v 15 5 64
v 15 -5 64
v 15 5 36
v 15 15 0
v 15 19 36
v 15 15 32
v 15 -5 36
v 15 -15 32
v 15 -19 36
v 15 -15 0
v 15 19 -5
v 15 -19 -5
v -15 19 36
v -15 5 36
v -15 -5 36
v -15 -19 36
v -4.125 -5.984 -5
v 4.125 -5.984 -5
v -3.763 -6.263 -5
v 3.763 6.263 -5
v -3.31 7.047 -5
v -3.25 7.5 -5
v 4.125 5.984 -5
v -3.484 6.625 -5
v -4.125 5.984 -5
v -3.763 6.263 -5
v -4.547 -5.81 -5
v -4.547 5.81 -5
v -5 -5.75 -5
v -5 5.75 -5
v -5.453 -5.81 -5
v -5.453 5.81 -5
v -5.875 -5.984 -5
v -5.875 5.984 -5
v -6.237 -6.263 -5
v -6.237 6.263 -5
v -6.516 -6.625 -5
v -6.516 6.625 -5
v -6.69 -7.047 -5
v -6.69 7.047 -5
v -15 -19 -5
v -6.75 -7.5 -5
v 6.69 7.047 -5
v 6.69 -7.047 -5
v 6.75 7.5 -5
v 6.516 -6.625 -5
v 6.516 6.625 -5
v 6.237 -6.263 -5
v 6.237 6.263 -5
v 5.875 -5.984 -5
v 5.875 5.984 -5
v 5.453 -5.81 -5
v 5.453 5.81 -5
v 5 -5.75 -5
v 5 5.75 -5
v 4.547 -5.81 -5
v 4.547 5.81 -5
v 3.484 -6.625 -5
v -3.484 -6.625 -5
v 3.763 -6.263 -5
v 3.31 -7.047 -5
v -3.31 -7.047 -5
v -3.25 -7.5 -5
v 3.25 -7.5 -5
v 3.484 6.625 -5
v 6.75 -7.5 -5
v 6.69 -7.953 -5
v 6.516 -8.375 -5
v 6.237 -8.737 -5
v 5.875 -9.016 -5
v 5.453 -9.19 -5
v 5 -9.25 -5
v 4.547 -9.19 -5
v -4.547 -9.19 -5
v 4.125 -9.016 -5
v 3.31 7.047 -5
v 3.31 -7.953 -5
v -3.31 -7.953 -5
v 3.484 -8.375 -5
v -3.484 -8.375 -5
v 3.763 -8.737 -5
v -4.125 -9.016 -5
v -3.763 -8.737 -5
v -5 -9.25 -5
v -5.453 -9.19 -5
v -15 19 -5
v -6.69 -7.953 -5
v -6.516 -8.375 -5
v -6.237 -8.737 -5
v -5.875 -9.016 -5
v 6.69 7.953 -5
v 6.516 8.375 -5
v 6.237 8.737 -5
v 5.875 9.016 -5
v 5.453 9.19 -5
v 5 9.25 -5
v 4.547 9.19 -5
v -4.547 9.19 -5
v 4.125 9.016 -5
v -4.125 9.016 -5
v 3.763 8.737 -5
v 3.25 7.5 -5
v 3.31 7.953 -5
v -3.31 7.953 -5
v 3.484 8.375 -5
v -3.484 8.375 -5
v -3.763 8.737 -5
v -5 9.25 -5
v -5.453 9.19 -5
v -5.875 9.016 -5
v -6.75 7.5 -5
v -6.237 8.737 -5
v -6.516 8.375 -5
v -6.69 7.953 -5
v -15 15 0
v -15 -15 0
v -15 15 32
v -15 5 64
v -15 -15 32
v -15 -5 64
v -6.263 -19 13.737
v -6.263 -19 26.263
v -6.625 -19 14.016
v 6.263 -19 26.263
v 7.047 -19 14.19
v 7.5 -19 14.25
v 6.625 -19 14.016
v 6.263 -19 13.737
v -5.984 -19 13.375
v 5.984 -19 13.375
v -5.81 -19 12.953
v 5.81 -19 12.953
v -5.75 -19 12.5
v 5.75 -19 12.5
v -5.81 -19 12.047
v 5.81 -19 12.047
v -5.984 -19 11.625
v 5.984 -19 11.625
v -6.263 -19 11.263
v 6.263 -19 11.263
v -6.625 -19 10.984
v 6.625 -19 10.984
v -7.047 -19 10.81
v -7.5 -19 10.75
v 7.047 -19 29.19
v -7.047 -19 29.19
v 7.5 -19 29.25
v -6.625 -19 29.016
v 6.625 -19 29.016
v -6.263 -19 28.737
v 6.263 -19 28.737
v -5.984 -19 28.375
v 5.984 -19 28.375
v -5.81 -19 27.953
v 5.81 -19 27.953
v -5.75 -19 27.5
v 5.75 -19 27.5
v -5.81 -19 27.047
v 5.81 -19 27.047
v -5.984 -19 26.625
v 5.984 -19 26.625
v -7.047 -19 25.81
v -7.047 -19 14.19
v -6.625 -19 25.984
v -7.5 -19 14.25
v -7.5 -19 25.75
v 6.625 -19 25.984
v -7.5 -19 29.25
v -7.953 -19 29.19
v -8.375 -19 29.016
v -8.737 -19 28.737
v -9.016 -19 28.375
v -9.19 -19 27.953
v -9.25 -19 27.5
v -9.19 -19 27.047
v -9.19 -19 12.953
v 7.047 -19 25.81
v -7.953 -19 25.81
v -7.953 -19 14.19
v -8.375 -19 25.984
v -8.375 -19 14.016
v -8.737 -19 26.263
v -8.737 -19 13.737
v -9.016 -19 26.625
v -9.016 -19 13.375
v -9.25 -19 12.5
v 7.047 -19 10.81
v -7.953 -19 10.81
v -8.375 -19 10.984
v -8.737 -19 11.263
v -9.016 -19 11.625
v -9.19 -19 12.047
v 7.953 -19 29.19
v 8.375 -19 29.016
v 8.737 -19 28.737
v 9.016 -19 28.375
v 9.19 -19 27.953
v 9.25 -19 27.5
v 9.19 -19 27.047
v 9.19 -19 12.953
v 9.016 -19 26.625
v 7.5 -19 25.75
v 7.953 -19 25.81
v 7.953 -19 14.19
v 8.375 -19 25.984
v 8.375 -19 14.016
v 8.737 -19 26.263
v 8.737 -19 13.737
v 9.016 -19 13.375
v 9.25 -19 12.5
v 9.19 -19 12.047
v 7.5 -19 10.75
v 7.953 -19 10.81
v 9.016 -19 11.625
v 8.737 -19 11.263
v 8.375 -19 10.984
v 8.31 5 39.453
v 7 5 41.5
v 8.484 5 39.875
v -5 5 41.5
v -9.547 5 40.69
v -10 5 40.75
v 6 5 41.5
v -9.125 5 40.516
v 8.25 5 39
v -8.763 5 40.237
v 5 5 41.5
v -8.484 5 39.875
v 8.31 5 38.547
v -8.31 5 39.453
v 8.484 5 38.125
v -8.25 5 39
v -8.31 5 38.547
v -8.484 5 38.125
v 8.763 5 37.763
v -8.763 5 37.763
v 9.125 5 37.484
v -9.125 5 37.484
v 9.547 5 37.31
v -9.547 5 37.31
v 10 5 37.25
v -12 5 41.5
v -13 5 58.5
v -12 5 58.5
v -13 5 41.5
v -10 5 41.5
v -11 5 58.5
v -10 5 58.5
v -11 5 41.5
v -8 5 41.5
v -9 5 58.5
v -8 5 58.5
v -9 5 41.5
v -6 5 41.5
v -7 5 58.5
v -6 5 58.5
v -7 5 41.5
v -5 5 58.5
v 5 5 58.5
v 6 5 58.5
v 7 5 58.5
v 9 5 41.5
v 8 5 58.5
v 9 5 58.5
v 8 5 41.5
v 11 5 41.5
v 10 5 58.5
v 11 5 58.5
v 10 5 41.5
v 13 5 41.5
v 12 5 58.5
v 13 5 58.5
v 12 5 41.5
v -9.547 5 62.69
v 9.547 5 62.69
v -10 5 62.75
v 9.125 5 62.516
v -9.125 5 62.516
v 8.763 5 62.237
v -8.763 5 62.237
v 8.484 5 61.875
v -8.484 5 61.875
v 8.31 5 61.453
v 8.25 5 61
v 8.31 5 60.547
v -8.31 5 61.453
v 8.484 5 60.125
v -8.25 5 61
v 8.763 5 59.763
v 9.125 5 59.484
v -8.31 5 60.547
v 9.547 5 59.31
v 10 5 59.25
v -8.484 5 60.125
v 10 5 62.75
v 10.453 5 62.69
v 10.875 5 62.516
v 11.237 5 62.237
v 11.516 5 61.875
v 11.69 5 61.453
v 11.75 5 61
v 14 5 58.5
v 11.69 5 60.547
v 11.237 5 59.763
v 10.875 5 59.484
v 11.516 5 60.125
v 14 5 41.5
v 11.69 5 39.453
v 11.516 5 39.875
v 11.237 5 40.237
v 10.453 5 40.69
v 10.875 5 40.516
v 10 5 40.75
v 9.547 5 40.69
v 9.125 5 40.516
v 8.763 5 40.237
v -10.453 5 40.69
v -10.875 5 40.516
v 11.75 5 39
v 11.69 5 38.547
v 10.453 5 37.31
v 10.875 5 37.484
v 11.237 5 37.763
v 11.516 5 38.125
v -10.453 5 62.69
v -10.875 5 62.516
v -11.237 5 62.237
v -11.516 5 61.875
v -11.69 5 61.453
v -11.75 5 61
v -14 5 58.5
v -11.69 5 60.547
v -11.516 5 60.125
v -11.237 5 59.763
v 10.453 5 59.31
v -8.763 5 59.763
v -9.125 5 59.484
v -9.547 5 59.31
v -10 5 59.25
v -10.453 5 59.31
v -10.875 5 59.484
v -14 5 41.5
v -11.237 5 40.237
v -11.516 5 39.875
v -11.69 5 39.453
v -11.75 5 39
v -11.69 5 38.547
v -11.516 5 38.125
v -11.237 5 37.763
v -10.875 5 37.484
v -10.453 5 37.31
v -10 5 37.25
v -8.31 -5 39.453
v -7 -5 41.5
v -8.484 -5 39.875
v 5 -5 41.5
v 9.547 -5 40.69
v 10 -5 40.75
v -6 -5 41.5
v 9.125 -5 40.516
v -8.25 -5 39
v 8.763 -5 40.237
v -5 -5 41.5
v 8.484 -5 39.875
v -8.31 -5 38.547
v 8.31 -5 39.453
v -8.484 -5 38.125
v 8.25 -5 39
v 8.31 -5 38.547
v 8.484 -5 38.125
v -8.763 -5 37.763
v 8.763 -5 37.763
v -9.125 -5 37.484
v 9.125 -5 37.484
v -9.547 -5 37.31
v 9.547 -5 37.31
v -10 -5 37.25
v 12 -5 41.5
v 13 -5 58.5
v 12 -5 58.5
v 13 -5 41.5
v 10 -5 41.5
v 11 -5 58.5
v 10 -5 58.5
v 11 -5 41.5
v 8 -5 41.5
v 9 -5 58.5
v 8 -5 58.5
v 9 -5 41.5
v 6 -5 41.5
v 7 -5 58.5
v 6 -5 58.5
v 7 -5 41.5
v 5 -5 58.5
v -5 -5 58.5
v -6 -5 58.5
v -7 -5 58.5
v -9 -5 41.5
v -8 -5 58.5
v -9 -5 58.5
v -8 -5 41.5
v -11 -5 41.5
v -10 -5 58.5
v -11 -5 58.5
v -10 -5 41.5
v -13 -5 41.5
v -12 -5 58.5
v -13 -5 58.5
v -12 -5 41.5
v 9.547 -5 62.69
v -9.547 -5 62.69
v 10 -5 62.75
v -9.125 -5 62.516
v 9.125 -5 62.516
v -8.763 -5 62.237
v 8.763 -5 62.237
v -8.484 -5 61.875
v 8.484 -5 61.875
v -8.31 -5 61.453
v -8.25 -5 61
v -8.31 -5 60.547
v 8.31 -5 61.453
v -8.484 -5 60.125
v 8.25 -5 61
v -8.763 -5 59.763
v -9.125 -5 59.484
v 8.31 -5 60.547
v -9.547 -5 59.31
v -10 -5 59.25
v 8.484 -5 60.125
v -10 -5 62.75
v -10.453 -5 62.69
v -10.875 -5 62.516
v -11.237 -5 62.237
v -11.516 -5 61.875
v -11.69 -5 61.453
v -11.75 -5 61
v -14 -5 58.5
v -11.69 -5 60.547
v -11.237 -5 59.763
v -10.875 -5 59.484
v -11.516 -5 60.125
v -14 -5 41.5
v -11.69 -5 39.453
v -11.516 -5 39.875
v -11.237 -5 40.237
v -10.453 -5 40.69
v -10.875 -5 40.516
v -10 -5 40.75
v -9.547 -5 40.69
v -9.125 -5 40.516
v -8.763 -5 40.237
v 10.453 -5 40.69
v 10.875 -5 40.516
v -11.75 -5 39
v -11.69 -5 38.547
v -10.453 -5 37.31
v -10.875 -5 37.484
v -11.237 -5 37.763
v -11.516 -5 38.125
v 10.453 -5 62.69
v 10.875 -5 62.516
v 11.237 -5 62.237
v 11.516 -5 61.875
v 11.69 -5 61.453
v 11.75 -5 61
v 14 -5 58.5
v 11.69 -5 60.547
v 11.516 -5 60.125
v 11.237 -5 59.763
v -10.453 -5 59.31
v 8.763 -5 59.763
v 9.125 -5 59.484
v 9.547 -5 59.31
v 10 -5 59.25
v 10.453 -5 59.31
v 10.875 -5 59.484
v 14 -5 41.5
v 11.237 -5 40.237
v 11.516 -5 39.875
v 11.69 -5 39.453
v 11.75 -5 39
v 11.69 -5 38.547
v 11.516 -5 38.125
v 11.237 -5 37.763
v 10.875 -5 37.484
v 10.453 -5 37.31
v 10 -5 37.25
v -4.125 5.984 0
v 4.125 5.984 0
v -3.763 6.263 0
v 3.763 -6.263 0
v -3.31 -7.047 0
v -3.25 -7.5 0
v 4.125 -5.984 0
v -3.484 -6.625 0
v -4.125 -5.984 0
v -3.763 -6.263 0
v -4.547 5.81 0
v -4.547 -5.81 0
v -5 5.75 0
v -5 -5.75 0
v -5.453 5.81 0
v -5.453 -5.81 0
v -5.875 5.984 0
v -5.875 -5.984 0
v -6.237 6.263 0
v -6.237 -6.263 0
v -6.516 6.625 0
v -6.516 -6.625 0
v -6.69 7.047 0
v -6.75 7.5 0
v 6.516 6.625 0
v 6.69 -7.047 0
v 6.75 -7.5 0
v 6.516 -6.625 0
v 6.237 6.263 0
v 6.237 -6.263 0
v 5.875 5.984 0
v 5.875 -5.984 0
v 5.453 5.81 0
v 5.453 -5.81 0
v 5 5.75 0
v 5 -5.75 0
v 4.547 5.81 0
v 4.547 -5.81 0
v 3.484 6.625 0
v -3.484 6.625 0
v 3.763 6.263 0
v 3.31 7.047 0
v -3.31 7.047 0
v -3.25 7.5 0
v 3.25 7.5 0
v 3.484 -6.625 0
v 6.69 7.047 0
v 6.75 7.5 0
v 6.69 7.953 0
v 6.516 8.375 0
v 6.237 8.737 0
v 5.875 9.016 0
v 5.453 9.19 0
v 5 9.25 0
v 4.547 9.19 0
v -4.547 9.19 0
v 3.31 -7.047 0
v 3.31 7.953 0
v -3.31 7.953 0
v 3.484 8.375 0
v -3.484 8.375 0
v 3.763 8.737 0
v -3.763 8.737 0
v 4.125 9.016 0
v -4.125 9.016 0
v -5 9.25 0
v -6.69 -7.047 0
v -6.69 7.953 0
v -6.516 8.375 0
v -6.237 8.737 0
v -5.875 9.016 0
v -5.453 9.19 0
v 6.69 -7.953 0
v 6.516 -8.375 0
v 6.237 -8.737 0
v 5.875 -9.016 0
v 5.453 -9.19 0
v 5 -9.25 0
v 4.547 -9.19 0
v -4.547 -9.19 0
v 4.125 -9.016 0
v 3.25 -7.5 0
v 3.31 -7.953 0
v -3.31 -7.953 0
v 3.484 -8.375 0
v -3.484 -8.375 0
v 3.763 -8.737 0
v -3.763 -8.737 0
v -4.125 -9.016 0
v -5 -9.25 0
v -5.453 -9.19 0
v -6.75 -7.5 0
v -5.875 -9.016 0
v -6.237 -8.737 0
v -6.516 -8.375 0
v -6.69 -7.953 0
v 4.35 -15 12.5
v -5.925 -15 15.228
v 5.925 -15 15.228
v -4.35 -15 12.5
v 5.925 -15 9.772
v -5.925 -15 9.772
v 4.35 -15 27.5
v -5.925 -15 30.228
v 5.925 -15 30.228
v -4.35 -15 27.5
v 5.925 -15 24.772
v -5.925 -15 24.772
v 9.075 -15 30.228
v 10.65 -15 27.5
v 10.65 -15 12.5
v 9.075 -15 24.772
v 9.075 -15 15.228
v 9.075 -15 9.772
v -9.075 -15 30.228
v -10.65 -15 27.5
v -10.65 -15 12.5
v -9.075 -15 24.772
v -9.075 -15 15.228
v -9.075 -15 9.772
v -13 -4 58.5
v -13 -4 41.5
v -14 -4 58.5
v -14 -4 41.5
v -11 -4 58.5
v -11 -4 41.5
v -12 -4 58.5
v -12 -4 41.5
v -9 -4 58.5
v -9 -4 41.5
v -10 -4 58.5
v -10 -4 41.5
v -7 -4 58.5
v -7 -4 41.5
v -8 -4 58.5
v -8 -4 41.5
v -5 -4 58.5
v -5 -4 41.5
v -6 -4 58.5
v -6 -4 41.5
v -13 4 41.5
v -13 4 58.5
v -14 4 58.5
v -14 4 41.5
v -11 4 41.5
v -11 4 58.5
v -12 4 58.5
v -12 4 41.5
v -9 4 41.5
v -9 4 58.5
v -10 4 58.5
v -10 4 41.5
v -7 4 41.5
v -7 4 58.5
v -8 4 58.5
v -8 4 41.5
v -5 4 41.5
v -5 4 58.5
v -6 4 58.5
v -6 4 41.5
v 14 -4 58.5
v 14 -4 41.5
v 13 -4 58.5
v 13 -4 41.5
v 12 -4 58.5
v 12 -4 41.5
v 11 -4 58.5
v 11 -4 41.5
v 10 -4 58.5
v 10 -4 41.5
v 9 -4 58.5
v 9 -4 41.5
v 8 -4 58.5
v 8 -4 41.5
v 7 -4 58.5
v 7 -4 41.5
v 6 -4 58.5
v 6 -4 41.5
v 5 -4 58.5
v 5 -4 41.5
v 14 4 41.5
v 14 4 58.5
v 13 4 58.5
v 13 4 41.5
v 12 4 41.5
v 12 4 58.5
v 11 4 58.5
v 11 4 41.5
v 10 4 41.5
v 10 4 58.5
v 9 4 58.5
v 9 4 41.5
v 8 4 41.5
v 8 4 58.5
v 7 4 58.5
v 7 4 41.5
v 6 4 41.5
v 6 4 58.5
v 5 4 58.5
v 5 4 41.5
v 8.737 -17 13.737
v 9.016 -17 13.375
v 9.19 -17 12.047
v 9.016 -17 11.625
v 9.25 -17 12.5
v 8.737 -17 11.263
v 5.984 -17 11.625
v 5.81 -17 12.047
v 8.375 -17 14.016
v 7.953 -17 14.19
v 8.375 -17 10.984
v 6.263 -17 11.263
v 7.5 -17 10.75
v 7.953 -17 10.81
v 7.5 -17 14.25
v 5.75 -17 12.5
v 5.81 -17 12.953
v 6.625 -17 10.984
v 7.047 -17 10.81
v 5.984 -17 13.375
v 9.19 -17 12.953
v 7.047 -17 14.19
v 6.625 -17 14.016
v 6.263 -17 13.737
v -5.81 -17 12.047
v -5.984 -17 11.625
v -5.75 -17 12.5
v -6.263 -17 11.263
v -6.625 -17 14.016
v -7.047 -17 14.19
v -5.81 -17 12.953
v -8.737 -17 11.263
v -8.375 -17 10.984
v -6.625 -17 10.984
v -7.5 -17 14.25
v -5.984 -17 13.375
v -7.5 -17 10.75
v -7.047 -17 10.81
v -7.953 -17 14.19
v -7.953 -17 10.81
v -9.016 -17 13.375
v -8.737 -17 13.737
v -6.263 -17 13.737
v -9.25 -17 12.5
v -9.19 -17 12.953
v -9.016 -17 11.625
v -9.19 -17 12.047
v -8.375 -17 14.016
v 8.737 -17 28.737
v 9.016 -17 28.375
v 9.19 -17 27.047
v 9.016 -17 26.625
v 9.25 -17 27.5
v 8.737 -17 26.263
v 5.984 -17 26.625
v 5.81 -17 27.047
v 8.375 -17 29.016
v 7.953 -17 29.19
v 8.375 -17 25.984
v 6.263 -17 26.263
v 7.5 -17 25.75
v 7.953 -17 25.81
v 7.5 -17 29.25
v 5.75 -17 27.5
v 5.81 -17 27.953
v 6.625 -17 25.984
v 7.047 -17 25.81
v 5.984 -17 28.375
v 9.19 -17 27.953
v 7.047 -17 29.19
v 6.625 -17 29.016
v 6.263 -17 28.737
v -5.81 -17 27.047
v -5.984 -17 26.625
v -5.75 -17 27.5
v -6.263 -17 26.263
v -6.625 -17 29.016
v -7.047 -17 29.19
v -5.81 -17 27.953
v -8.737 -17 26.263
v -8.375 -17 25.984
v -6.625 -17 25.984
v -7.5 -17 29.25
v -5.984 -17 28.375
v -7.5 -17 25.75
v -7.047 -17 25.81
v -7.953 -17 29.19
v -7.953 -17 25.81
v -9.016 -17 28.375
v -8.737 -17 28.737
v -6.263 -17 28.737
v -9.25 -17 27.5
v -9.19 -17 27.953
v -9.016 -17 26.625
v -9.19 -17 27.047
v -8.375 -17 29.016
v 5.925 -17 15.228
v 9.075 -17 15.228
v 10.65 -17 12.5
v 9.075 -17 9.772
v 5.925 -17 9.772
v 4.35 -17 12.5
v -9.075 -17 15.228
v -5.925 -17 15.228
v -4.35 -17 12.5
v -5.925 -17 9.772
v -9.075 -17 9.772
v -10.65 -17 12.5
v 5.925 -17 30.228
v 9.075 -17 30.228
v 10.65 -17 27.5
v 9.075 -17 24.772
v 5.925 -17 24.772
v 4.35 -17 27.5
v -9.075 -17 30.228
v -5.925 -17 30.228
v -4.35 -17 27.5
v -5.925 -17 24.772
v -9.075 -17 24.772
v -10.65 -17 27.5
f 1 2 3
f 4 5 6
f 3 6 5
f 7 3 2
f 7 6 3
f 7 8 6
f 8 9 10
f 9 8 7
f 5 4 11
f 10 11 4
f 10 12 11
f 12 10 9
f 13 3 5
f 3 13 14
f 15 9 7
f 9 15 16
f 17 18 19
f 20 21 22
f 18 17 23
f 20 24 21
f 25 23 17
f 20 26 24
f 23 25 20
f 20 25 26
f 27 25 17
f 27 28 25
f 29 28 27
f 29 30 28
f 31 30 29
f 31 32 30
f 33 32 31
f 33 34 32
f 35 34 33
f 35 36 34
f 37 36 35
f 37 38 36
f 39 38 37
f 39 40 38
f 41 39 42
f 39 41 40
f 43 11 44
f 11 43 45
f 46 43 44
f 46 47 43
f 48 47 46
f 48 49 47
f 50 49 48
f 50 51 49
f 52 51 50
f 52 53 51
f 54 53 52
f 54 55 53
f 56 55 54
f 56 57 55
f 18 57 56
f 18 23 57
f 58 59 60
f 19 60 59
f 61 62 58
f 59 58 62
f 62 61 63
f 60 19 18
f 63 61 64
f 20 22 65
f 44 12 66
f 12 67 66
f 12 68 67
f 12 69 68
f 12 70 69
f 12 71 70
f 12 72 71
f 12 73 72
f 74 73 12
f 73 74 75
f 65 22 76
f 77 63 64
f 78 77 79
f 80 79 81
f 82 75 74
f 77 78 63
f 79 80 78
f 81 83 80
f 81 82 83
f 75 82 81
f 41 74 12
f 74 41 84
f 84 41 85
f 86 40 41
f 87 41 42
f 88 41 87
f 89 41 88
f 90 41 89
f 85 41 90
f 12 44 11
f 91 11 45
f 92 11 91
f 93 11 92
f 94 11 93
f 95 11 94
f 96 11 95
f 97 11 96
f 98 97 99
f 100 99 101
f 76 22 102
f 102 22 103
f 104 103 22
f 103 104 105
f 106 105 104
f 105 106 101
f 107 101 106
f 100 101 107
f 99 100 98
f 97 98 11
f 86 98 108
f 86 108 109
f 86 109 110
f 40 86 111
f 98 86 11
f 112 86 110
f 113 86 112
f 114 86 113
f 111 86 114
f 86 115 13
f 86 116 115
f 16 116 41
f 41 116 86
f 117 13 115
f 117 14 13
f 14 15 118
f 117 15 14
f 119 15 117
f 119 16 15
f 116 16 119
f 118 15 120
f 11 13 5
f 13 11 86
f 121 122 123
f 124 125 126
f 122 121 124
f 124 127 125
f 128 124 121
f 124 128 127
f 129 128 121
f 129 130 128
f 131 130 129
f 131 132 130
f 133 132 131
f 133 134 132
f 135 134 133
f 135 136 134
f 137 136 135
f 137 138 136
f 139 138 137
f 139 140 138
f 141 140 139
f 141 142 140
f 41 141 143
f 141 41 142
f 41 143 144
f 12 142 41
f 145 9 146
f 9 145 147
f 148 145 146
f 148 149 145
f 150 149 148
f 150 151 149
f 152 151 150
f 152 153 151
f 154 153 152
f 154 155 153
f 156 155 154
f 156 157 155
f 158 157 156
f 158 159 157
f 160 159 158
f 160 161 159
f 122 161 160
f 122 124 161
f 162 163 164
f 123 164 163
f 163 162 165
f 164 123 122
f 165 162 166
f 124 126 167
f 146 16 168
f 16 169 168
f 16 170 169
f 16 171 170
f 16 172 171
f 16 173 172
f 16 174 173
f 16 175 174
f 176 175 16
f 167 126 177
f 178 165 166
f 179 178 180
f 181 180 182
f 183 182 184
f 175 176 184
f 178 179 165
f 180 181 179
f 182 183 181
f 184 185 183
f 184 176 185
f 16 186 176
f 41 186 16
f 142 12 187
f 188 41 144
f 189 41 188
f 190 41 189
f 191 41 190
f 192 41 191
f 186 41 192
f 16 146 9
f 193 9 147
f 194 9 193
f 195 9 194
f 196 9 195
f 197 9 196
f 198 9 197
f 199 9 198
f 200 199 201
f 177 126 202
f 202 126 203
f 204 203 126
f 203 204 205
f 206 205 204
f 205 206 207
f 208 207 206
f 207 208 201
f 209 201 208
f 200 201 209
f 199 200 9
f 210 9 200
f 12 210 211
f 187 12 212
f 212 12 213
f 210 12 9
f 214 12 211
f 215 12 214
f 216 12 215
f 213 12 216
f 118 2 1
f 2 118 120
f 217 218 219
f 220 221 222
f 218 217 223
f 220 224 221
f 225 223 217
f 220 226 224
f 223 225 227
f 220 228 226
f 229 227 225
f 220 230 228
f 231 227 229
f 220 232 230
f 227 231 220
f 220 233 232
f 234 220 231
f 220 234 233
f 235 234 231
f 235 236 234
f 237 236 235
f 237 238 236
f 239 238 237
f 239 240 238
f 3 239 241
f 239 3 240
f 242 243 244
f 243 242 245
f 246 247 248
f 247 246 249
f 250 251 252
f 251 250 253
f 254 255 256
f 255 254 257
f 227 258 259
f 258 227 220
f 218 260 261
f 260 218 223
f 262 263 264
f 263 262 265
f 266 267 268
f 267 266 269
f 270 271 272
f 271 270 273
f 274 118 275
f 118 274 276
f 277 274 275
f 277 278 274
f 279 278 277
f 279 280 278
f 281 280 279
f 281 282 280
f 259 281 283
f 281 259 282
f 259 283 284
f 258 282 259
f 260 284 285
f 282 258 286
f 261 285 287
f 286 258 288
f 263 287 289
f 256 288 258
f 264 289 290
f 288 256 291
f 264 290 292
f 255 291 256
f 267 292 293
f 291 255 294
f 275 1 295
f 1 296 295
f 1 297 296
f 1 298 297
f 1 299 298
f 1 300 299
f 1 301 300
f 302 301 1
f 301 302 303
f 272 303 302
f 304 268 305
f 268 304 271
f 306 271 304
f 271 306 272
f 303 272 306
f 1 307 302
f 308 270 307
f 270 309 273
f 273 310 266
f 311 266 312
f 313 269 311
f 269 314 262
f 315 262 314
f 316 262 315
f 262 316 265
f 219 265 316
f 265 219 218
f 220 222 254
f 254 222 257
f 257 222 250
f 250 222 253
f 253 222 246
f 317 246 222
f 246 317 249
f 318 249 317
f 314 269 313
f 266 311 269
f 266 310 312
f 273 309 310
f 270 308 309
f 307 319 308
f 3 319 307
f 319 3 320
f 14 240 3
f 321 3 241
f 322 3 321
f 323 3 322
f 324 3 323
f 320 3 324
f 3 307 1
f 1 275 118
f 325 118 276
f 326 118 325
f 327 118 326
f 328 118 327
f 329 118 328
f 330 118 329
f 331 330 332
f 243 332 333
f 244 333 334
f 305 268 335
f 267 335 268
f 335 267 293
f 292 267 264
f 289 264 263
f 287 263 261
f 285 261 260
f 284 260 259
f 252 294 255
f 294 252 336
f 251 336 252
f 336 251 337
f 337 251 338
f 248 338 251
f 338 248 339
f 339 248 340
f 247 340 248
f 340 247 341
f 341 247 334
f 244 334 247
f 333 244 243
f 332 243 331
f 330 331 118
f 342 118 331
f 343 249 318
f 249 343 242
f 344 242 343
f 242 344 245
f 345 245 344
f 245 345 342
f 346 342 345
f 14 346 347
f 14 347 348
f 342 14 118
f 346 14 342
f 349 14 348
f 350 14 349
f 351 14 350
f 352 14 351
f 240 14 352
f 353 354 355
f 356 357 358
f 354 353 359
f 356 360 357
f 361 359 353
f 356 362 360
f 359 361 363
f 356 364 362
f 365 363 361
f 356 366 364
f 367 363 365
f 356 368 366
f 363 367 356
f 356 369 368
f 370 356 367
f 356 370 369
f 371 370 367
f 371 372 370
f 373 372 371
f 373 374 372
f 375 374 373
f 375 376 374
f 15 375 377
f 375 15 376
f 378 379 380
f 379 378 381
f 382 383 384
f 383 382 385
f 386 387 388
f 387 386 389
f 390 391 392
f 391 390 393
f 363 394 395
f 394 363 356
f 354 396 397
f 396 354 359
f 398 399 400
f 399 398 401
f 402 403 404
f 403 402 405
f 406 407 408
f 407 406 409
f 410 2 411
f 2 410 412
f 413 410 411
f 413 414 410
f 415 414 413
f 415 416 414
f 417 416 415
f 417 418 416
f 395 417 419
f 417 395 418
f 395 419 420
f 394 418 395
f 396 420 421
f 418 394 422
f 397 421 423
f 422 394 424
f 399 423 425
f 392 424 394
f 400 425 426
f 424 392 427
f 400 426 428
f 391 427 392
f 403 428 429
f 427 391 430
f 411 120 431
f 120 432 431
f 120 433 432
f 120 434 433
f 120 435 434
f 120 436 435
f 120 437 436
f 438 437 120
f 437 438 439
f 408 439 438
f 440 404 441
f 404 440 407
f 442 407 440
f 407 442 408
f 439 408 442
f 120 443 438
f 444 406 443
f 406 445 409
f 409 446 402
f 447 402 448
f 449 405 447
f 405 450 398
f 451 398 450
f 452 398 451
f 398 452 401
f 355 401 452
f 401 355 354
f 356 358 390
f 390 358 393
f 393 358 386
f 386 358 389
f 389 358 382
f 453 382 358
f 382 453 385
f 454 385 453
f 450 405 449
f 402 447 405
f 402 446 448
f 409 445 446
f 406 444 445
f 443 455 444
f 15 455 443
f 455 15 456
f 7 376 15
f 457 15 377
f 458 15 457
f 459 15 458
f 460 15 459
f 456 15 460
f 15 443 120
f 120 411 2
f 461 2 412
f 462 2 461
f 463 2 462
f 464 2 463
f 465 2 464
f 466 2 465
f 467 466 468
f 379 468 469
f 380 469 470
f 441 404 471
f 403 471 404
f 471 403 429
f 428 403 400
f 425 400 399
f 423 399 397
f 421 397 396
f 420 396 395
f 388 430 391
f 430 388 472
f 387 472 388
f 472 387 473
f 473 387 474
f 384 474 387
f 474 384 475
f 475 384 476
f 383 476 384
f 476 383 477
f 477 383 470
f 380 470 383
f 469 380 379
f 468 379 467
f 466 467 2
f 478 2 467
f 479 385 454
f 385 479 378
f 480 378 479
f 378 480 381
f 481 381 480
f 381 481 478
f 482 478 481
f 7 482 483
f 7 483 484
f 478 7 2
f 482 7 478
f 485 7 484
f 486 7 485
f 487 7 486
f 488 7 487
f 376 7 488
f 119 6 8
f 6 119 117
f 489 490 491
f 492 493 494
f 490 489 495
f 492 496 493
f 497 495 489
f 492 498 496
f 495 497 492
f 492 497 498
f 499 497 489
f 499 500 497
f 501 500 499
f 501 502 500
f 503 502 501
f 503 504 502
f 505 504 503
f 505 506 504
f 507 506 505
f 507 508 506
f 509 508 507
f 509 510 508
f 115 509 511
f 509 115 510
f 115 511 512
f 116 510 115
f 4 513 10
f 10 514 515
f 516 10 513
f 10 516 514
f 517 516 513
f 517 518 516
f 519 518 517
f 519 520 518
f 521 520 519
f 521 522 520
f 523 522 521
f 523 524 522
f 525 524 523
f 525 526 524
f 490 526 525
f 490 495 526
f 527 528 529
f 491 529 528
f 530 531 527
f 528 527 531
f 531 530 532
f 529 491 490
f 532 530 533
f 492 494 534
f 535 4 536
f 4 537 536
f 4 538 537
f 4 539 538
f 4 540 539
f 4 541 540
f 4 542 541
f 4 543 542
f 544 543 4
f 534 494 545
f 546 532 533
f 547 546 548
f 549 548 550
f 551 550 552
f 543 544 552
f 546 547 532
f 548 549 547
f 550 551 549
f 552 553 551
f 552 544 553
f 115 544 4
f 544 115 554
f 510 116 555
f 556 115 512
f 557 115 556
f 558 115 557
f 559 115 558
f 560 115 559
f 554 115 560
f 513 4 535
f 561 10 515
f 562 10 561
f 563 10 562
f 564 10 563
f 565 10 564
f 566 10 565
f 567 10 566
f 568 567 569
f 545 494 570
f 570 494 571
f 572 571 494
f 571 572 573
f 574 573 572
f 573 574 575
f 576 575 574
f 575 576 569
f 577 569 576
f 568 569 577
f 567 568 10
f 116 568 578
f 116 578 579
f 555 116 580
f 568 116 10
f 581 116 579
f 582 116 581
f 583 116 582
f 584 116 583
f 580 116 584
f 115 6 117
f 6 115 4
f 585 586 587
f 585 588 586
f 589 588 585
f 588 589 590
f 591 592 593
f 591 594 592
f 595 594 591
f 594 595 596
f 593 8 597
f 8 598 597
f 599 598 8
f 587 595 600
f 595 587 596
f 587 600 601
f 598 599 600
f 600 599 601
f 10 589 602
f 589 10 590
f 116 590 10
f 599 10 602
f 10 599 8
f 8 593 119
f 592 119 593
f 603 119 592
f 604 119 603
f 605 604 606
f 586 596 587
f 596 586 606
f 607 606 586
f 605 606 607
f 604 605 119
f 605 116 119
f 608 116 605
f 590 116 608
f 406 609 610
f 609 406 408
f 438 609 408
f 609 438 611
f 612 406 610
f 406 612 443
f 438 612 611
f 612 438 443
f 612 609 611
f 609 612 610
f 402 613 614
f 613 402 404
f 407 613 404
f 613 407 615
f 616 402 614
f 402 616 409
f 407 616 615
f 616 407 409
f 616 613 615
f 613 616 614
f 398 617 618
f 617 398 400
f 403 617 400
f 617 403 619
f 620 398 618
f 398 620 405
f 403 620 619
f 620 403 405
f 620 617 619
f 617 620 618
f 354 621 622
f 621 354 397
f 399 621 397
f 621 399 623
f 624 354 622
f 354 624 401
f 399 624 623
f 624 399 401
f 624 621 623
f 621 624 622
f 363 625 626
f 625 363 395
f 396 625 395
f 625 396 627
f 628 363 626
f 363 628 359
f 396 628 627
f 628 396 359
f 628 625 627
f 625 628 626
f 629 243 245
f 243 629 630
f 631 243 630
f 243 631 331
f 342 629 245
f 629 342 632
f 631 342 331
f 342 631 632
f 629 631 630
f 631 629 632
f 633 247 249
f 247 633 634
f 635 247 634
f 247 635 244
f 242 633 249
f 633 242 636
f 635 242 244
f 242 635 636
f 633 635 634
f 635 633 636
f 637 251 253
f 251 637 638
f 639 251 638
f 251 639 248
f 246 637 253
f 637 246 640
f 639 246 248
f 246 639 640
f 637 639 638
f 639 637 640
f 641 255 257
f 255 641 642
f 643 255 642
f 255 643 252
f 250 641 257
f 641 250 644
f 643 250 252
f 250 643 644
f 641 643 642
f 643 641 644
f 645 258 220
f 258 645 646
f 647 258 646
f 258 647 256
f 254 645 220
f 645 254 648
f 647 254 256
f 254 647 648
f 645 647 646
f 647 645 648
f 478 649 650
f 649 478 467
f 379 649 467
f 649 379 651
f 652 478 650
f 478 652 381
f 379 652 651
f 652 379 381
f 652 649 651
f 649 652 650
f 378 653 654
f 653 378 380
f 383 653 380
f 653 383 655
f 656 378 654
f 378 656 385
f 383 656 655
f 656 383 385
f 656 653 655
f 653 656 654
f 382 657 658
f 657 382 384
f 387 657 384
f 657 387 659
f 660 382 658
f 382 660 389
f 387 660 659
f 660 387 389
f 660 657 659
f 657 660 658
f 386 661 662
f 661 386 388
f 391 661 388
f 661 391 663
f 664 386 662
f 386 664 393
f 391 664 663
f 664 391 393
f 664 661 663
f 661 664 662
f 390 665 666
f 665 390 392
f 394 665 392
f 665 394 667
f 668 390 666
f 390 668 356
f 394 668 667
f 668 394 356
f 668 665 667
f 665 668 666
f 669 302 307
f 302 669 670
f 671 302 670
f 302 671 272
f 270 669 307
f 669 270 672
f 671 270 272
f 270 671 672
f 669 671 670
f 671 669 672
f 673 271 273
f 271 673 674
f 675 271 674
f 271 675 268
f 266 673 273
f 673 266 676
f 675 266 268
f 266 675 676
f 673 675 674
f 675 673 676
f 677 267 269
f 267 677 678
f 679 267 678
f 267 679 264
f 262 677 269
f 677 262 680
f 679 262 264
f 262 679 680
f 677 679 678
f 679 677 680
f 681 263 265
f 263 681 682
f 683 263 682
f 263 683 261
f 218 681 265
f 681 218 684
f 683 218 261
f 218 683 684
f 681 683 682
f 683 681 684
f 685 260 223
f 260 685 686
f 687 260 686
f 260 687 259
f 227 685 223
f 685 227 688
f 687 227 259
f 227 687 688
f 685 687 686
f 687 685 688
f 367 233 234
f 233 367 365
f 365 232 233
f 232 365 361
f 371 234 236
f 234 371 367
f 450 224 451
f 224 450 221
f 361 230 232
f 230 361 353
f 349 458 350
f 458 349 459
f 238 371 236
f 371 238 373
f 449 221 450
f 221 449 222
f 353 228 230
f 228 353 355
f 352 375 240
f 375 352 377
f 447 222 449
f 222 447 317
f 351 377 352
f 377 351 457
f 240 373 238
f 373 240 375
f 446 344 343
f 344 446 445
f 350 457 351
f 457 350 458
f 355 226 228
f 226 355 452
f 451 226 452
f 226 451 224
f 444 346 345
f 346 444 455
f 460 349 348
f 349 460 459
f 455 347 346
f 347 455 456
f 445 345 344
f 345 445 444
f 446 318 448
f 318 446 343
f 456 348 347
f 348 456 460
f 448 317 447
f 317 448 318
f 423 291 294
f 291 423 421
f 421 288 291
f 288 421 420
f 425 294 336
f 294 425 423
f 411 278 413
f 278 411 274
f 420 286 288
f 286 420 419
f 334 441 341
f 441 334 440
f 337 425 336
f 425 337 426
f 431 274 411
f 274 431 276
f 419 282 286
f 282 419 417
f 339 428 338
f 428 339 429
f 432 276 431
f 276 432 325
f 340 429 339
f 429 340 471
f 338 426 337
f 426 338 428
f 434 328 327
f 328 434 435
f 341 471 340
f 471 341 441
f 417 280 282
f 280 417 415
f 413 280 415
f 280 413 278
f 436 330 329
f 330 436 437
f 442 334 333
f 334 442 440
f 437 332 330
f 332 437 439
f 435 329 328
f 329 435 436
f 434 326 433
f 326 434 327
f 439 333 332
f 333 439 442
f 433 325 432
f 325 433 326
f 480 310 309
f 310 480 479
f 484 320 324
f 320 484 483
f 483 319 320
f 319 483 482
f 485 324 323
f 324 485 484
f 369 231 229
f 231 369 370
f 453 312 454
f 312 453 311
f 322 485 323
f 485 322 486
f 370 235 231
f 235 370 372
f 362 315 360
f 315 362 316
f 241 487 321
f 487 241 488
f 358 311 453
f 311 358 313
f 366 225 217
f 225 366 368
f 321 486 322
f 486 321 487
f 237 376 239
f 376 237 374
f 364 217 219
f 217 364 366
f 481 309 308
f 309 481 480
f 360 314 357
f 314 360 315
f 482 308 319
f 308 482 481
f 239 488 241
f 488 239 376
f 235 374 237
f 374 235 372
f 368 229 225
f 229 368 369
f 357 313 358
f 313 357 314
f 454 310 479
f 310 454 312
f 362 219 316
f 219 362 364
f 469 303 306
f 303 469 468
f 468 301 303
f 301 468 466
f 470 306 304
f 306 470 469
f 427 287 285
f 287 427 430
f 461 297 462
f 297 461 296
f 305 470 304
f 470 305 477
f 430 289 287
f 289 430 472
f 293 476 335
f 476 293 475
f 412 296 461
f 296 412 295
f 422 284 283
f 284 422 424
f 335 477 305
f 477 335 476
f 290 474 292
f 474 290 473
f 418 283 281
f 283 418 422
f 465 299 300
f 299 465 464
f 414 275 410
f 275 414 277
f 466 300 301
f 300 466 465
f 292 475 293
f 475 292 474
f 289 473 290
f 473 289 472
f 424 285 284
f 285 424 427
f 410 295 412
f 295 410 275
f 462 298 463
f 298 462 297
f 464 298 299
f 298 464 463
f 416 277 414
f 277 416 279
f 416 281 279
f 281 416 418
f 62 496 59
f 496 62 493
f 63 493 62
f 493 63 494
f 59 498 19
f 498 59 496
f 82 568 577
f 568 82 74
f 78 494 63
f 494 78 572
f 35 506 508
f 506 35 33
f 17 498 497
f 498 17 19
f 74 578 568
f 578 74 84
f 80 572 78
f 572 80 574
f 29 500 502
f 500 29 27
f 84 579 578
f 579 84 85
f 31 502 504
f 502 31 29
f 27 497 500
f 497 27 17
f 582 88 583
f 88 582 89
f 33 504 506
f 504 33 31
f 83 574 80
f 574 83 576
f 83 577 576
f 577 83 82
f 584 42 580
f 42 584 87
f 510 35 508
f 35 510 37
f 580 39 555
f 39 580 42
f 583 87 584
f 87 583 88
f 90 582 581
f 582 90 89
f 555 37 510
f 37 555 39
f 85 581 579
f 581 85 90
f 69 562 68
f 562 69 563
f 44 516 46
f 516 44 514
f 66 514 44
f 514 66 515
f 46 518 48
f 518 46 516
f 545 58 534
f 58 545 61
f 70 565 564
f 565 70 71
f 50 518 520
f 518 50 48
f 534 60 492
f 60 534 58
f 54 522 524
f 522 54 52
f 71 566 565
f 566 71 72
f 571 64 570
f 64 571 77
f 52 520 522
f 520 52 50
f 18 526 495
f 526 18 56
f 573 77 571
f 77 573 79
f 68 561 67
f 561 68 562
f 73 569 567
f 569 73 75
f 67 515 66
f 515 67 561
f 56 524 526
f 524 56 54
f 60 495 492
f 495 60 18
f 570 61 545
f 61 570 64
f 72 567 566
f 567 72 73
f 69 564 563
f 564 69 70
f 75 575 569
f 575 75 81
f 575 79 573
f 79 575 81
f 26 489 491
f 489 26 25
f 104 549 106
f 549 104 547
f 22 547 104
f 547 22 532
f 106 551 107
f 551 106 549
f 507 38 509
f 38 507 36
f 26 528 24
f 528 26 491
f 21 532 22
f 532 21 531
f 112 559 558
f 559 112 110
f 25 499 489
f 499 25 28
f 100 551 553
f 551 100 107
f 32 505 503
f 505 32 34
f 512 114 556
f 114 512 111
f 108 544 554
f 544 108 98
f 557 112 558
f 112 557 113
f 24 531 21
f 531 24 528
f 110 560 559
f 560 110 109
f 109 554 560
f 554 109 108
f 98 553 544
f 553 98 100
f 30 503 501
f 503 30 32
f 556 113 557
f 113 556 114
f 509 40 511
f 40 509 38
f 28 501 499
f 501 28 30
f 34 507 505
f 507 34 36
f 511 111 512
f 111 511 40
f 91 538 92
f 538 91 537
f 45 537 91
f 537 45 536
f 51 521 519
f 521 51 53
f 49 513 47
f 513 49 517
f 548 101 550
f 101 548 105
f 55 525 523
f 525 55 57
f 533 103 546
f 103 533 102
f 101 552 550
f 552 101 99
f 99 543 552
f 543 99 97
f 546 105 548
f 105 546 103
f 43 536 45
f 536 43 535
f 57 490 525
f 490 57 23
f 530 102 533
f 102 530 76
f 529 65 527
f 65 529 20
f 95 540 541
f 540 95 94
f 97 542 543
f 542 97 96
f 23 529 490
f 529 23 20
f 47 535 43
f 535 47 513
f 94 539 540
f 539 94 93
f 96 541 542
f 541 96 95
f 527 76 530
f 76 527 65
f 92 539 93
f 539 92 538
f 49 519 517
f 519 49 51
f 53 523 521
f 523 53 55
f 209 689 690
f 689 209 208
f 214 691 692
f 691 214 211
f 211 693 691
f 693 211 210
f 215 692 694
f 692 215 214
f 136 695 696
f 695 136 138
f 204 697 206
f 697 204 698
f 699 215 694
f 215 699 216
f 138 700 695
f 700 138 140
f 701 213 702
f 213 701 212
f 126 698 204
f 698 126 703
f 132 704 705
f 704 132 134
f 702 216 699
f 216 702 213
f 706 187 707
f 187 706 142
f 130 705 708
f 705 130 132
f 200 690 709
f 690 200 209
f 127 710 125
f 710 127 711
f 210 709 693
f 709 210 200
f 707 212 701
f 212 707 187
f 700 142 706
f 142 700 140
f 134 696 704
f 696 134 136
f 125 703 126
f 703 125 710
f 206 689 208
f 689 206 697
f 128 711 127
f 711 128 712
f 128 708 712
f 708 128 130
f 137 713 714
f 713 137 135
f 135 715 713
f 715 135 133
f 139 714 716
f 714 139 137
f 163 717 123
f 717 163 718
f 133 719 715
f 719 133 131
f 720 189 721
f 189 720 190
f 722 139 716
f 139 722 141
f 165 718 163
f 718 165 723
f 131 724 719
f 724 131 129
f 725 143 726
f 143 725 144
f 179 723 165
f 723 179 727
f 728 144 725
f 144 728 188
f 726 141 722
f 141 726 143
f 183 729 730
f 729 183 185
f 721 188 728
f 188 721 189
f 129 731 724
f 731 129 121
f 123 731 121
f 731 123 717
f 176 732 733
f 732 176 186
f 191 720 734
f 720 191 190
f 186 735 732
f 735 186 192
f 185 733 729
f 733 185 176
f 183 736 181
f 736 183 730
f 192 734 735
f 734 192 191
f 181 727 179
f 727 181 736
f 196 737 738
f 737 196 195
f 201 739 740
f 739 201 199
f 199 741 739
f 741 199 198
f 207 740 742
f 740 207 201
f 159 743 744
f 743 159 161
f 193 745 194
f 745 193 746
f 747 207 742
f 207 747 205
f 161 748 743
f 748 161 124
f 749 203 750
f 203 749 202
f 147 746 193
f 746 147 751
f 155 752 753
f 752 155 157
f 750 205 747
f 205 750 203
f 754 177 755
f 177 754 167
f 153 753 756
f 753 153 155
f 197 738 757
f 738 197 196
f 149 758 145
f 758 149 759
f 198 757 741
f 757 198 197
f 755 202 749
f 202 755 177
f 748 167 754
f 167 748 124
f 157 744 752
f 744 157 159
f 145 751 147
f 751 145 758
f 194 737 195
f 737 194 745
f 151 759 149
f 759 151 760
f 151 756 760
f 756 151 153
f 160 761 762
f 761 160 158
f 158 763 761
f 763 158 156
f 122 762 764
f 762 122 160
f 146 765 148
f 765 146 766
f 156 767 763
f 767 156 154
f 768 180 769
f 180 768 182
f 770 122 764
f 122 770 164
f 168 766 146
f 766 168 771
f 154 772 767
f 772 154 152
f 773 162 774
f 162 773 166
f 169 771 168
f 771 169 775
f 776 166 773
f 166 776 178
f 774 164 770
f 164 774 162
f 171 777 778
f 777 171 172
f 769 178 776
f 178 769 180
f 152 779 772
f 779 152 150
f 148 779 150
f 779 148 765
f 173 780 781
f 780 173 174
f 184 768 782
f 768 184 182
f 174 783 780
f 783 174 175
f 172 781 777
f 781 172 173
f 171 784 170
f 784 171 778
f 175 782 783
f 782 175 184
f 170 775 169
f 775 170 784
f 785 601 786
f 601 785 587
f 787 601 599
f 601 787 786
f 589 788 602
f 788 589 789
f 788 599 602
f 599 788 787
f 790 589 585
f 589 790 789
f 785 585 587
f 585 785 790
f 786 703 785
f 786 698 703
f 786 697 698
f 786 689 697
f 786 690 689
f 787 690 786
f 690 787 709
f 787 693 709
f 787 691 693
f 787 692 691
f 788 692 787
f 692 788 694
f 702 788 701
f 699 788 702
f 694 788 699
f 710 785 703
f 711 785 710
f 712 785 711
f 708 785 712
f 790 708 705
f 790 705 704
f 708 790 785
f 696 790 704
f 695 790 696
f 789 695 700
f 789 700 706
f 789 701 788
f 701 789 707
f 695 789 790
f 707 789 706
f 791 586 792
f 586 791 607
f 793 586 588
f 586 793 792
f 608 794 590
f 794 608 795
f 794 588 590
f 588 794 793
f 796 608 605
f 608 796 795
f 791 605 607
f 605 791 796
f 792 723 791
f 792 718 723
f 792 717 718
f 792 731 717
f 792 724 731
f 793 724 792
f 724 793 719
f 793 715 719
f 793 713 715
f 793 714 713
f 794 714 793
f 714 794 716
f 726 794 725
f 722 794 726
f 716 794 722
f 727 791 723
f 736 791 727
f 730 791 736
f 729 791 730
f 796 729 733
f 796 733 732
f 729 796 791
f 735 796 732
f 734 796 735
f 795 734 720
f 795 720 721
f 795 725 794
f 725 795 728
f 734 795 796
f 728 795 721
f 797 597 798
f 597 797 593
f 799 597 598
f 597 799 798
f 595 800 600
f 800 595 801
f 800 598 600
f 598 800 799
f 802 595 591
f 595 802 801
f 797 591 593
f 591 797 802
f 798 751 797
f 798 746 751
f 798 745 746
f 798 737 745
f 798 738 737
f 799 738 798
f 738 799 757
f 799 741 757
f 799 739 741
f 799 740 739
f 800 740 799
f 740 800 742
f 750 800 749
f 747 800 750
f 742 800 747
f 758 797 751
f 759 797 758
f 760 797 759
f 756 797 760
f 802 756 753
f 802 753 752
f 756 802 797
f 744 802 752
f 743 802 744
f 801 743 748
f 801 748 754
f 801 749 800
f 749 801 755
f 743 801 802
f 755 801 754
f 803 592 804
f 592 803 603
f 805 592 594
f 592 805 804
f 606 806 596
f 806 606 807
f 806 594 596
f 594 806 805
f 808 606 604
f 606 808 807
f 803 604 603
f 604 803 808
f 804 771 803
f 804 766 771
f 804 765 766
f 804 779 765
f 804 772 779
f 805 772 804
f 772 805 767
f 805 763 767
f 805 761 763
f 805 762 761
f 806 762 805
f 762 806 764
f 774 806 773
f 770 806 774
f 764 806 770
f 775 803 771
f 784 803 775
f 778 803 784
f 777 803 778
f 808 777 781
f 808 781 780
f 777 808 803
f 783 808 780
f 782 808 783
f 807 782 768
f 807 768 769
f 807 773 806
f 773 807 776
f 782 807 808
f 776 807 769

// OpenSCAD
difference()
{
    union()
    {
        translate([-15,-15-4,-4-1])
            cube([30,30+2*4,40+2*4+1-8]);
        
        translate([-15,-5,32+4])
            cube([30,10,4+20+4]);
    }
    union()
    {
        translate([-15,-15,0])
            cube([30,30,32]);
        
        translate([-14,-5,32+4+5.5])
            cube([1,1,17]);
        translate([-12,-5,32+4+5.5])
            cube([1,1,17]);
        translate([-10,-5,32+4+5.5])
            cube([1,1,17]);
        translate([-8,-5,32+4+5.5])
            cube([1,1,17]);
        translate([-6,-5,32+4+5.5])
            cube([1,1,17]);
        
        translate([-14,4,32+4+5.5])
            cube([1,1,17]);
        translate([-12,4,32+4+5.5])
            cube([1,1,17]);
        translate([-10,4,32+4+5.5])
            cube([1,1,17]);
        translate([-8,4,32+4+5.5])
            cube([1,1,17]);
        translate([-6,4,32+4+5.5])
            cube([1,1,17]);
            
        translate([13,-5,32+4+5.5])
            cube([1,1,17]);
        translate([11,-5,32+4+5.5])
            cube([1,1,17]);
        translate([9,-5,32+4+5.5])
            cube([1,1,17]);
        translate([7,-5,32+4+5.5])
            cube([1,1,17]);
        translate([5,-5,32+4+5.5])
            cube([1,1,17]);
        
        translate([13,4,32+4+5.5])
            cube([1,1,17]);
        translate([11,4,32+4+5.5])
            cube([1,1,17]);
        translate([9,4,32+4+5.5])
            cube([1,1,17]);
        translate([7,4,32+4+5.5])
            cube([1,1,17]);
        translate([5,4,32+4+5.5])
            cube([1,1,17]);
            
        
        translate([-10,-5,32+4+3])
            rotate([270,0,0])
                cylinder(d=3.5,h=40,$fn=24);
        translate([-10,-5,32+4+3+20+2])
            rotate([270,0,0])
                cylinder(d=3.5,h=40,$fn=24);
        
        translate([10,-5,32+4+3])
            rotate([270,0,0])
                cylinder(d=3.5,h=40,$fn=24);
        translate([10,-5,32+4+3+20+2])
            rotate([270,0,0])
                cylinder(d=3.5,h=40,$fn=24);
        
        
        
        translate([-10/2,-15/2,-4-1])
            cylinder(d=3.5,h=20+2*4,$fn=24);
        translate([10/2,-15/2,-4-1])
            cylinder(d=3.5,h=20+2*4,$fn=24);
        translate([-10/2,15/2,-4-1])
            cylinder(d=3.5,h=20+2*4,$fn=24);
        translate([10/2,15/2,-4-1])
            cylinder(d=3.5,h=20+2*4,$fn=24);
        
        translate([7.5,-15-4,20-7.5])
            rotate([270,0,0])
                cylinder(d=3.5,h=20,$fn=24);
        translate([-7.5,-15-4,20-7.5])
            rotate([270,0,0])
                cylinder(d=3.5,h=20,$fn=24);
        translate([7.5,-15-4,20+7.5])
            rotate([270,0,0])
                cylinder(d=3.5,h=20,$fn=24);
        translate([-7.5,-15-4,20+7.5])
            rotate([270,0,0])
                cylinder(d=3.5,h=20,$fn=24);
                
        translate([7.5,-15-2,20-7.5])
            rotate([270,0,0])
                cylinder(d=6.3,h=20,$fn=6);
        translate([-7.5,-15-2,20-7.5])
            rotate([270,0,0])
                cylinder(d=6.3,h=20,$fn=6);
        translate([7.5,-15-2,20+7.5])
            rotate([270,0,0])
                cylinder(d=6.3,h=20,$fn=6);
        translate([-7.5,-15-2,20+7.5])
            rotate([270,0,0])
                cylinder(d=6.3,h=20,$fn=6);
    }
}
